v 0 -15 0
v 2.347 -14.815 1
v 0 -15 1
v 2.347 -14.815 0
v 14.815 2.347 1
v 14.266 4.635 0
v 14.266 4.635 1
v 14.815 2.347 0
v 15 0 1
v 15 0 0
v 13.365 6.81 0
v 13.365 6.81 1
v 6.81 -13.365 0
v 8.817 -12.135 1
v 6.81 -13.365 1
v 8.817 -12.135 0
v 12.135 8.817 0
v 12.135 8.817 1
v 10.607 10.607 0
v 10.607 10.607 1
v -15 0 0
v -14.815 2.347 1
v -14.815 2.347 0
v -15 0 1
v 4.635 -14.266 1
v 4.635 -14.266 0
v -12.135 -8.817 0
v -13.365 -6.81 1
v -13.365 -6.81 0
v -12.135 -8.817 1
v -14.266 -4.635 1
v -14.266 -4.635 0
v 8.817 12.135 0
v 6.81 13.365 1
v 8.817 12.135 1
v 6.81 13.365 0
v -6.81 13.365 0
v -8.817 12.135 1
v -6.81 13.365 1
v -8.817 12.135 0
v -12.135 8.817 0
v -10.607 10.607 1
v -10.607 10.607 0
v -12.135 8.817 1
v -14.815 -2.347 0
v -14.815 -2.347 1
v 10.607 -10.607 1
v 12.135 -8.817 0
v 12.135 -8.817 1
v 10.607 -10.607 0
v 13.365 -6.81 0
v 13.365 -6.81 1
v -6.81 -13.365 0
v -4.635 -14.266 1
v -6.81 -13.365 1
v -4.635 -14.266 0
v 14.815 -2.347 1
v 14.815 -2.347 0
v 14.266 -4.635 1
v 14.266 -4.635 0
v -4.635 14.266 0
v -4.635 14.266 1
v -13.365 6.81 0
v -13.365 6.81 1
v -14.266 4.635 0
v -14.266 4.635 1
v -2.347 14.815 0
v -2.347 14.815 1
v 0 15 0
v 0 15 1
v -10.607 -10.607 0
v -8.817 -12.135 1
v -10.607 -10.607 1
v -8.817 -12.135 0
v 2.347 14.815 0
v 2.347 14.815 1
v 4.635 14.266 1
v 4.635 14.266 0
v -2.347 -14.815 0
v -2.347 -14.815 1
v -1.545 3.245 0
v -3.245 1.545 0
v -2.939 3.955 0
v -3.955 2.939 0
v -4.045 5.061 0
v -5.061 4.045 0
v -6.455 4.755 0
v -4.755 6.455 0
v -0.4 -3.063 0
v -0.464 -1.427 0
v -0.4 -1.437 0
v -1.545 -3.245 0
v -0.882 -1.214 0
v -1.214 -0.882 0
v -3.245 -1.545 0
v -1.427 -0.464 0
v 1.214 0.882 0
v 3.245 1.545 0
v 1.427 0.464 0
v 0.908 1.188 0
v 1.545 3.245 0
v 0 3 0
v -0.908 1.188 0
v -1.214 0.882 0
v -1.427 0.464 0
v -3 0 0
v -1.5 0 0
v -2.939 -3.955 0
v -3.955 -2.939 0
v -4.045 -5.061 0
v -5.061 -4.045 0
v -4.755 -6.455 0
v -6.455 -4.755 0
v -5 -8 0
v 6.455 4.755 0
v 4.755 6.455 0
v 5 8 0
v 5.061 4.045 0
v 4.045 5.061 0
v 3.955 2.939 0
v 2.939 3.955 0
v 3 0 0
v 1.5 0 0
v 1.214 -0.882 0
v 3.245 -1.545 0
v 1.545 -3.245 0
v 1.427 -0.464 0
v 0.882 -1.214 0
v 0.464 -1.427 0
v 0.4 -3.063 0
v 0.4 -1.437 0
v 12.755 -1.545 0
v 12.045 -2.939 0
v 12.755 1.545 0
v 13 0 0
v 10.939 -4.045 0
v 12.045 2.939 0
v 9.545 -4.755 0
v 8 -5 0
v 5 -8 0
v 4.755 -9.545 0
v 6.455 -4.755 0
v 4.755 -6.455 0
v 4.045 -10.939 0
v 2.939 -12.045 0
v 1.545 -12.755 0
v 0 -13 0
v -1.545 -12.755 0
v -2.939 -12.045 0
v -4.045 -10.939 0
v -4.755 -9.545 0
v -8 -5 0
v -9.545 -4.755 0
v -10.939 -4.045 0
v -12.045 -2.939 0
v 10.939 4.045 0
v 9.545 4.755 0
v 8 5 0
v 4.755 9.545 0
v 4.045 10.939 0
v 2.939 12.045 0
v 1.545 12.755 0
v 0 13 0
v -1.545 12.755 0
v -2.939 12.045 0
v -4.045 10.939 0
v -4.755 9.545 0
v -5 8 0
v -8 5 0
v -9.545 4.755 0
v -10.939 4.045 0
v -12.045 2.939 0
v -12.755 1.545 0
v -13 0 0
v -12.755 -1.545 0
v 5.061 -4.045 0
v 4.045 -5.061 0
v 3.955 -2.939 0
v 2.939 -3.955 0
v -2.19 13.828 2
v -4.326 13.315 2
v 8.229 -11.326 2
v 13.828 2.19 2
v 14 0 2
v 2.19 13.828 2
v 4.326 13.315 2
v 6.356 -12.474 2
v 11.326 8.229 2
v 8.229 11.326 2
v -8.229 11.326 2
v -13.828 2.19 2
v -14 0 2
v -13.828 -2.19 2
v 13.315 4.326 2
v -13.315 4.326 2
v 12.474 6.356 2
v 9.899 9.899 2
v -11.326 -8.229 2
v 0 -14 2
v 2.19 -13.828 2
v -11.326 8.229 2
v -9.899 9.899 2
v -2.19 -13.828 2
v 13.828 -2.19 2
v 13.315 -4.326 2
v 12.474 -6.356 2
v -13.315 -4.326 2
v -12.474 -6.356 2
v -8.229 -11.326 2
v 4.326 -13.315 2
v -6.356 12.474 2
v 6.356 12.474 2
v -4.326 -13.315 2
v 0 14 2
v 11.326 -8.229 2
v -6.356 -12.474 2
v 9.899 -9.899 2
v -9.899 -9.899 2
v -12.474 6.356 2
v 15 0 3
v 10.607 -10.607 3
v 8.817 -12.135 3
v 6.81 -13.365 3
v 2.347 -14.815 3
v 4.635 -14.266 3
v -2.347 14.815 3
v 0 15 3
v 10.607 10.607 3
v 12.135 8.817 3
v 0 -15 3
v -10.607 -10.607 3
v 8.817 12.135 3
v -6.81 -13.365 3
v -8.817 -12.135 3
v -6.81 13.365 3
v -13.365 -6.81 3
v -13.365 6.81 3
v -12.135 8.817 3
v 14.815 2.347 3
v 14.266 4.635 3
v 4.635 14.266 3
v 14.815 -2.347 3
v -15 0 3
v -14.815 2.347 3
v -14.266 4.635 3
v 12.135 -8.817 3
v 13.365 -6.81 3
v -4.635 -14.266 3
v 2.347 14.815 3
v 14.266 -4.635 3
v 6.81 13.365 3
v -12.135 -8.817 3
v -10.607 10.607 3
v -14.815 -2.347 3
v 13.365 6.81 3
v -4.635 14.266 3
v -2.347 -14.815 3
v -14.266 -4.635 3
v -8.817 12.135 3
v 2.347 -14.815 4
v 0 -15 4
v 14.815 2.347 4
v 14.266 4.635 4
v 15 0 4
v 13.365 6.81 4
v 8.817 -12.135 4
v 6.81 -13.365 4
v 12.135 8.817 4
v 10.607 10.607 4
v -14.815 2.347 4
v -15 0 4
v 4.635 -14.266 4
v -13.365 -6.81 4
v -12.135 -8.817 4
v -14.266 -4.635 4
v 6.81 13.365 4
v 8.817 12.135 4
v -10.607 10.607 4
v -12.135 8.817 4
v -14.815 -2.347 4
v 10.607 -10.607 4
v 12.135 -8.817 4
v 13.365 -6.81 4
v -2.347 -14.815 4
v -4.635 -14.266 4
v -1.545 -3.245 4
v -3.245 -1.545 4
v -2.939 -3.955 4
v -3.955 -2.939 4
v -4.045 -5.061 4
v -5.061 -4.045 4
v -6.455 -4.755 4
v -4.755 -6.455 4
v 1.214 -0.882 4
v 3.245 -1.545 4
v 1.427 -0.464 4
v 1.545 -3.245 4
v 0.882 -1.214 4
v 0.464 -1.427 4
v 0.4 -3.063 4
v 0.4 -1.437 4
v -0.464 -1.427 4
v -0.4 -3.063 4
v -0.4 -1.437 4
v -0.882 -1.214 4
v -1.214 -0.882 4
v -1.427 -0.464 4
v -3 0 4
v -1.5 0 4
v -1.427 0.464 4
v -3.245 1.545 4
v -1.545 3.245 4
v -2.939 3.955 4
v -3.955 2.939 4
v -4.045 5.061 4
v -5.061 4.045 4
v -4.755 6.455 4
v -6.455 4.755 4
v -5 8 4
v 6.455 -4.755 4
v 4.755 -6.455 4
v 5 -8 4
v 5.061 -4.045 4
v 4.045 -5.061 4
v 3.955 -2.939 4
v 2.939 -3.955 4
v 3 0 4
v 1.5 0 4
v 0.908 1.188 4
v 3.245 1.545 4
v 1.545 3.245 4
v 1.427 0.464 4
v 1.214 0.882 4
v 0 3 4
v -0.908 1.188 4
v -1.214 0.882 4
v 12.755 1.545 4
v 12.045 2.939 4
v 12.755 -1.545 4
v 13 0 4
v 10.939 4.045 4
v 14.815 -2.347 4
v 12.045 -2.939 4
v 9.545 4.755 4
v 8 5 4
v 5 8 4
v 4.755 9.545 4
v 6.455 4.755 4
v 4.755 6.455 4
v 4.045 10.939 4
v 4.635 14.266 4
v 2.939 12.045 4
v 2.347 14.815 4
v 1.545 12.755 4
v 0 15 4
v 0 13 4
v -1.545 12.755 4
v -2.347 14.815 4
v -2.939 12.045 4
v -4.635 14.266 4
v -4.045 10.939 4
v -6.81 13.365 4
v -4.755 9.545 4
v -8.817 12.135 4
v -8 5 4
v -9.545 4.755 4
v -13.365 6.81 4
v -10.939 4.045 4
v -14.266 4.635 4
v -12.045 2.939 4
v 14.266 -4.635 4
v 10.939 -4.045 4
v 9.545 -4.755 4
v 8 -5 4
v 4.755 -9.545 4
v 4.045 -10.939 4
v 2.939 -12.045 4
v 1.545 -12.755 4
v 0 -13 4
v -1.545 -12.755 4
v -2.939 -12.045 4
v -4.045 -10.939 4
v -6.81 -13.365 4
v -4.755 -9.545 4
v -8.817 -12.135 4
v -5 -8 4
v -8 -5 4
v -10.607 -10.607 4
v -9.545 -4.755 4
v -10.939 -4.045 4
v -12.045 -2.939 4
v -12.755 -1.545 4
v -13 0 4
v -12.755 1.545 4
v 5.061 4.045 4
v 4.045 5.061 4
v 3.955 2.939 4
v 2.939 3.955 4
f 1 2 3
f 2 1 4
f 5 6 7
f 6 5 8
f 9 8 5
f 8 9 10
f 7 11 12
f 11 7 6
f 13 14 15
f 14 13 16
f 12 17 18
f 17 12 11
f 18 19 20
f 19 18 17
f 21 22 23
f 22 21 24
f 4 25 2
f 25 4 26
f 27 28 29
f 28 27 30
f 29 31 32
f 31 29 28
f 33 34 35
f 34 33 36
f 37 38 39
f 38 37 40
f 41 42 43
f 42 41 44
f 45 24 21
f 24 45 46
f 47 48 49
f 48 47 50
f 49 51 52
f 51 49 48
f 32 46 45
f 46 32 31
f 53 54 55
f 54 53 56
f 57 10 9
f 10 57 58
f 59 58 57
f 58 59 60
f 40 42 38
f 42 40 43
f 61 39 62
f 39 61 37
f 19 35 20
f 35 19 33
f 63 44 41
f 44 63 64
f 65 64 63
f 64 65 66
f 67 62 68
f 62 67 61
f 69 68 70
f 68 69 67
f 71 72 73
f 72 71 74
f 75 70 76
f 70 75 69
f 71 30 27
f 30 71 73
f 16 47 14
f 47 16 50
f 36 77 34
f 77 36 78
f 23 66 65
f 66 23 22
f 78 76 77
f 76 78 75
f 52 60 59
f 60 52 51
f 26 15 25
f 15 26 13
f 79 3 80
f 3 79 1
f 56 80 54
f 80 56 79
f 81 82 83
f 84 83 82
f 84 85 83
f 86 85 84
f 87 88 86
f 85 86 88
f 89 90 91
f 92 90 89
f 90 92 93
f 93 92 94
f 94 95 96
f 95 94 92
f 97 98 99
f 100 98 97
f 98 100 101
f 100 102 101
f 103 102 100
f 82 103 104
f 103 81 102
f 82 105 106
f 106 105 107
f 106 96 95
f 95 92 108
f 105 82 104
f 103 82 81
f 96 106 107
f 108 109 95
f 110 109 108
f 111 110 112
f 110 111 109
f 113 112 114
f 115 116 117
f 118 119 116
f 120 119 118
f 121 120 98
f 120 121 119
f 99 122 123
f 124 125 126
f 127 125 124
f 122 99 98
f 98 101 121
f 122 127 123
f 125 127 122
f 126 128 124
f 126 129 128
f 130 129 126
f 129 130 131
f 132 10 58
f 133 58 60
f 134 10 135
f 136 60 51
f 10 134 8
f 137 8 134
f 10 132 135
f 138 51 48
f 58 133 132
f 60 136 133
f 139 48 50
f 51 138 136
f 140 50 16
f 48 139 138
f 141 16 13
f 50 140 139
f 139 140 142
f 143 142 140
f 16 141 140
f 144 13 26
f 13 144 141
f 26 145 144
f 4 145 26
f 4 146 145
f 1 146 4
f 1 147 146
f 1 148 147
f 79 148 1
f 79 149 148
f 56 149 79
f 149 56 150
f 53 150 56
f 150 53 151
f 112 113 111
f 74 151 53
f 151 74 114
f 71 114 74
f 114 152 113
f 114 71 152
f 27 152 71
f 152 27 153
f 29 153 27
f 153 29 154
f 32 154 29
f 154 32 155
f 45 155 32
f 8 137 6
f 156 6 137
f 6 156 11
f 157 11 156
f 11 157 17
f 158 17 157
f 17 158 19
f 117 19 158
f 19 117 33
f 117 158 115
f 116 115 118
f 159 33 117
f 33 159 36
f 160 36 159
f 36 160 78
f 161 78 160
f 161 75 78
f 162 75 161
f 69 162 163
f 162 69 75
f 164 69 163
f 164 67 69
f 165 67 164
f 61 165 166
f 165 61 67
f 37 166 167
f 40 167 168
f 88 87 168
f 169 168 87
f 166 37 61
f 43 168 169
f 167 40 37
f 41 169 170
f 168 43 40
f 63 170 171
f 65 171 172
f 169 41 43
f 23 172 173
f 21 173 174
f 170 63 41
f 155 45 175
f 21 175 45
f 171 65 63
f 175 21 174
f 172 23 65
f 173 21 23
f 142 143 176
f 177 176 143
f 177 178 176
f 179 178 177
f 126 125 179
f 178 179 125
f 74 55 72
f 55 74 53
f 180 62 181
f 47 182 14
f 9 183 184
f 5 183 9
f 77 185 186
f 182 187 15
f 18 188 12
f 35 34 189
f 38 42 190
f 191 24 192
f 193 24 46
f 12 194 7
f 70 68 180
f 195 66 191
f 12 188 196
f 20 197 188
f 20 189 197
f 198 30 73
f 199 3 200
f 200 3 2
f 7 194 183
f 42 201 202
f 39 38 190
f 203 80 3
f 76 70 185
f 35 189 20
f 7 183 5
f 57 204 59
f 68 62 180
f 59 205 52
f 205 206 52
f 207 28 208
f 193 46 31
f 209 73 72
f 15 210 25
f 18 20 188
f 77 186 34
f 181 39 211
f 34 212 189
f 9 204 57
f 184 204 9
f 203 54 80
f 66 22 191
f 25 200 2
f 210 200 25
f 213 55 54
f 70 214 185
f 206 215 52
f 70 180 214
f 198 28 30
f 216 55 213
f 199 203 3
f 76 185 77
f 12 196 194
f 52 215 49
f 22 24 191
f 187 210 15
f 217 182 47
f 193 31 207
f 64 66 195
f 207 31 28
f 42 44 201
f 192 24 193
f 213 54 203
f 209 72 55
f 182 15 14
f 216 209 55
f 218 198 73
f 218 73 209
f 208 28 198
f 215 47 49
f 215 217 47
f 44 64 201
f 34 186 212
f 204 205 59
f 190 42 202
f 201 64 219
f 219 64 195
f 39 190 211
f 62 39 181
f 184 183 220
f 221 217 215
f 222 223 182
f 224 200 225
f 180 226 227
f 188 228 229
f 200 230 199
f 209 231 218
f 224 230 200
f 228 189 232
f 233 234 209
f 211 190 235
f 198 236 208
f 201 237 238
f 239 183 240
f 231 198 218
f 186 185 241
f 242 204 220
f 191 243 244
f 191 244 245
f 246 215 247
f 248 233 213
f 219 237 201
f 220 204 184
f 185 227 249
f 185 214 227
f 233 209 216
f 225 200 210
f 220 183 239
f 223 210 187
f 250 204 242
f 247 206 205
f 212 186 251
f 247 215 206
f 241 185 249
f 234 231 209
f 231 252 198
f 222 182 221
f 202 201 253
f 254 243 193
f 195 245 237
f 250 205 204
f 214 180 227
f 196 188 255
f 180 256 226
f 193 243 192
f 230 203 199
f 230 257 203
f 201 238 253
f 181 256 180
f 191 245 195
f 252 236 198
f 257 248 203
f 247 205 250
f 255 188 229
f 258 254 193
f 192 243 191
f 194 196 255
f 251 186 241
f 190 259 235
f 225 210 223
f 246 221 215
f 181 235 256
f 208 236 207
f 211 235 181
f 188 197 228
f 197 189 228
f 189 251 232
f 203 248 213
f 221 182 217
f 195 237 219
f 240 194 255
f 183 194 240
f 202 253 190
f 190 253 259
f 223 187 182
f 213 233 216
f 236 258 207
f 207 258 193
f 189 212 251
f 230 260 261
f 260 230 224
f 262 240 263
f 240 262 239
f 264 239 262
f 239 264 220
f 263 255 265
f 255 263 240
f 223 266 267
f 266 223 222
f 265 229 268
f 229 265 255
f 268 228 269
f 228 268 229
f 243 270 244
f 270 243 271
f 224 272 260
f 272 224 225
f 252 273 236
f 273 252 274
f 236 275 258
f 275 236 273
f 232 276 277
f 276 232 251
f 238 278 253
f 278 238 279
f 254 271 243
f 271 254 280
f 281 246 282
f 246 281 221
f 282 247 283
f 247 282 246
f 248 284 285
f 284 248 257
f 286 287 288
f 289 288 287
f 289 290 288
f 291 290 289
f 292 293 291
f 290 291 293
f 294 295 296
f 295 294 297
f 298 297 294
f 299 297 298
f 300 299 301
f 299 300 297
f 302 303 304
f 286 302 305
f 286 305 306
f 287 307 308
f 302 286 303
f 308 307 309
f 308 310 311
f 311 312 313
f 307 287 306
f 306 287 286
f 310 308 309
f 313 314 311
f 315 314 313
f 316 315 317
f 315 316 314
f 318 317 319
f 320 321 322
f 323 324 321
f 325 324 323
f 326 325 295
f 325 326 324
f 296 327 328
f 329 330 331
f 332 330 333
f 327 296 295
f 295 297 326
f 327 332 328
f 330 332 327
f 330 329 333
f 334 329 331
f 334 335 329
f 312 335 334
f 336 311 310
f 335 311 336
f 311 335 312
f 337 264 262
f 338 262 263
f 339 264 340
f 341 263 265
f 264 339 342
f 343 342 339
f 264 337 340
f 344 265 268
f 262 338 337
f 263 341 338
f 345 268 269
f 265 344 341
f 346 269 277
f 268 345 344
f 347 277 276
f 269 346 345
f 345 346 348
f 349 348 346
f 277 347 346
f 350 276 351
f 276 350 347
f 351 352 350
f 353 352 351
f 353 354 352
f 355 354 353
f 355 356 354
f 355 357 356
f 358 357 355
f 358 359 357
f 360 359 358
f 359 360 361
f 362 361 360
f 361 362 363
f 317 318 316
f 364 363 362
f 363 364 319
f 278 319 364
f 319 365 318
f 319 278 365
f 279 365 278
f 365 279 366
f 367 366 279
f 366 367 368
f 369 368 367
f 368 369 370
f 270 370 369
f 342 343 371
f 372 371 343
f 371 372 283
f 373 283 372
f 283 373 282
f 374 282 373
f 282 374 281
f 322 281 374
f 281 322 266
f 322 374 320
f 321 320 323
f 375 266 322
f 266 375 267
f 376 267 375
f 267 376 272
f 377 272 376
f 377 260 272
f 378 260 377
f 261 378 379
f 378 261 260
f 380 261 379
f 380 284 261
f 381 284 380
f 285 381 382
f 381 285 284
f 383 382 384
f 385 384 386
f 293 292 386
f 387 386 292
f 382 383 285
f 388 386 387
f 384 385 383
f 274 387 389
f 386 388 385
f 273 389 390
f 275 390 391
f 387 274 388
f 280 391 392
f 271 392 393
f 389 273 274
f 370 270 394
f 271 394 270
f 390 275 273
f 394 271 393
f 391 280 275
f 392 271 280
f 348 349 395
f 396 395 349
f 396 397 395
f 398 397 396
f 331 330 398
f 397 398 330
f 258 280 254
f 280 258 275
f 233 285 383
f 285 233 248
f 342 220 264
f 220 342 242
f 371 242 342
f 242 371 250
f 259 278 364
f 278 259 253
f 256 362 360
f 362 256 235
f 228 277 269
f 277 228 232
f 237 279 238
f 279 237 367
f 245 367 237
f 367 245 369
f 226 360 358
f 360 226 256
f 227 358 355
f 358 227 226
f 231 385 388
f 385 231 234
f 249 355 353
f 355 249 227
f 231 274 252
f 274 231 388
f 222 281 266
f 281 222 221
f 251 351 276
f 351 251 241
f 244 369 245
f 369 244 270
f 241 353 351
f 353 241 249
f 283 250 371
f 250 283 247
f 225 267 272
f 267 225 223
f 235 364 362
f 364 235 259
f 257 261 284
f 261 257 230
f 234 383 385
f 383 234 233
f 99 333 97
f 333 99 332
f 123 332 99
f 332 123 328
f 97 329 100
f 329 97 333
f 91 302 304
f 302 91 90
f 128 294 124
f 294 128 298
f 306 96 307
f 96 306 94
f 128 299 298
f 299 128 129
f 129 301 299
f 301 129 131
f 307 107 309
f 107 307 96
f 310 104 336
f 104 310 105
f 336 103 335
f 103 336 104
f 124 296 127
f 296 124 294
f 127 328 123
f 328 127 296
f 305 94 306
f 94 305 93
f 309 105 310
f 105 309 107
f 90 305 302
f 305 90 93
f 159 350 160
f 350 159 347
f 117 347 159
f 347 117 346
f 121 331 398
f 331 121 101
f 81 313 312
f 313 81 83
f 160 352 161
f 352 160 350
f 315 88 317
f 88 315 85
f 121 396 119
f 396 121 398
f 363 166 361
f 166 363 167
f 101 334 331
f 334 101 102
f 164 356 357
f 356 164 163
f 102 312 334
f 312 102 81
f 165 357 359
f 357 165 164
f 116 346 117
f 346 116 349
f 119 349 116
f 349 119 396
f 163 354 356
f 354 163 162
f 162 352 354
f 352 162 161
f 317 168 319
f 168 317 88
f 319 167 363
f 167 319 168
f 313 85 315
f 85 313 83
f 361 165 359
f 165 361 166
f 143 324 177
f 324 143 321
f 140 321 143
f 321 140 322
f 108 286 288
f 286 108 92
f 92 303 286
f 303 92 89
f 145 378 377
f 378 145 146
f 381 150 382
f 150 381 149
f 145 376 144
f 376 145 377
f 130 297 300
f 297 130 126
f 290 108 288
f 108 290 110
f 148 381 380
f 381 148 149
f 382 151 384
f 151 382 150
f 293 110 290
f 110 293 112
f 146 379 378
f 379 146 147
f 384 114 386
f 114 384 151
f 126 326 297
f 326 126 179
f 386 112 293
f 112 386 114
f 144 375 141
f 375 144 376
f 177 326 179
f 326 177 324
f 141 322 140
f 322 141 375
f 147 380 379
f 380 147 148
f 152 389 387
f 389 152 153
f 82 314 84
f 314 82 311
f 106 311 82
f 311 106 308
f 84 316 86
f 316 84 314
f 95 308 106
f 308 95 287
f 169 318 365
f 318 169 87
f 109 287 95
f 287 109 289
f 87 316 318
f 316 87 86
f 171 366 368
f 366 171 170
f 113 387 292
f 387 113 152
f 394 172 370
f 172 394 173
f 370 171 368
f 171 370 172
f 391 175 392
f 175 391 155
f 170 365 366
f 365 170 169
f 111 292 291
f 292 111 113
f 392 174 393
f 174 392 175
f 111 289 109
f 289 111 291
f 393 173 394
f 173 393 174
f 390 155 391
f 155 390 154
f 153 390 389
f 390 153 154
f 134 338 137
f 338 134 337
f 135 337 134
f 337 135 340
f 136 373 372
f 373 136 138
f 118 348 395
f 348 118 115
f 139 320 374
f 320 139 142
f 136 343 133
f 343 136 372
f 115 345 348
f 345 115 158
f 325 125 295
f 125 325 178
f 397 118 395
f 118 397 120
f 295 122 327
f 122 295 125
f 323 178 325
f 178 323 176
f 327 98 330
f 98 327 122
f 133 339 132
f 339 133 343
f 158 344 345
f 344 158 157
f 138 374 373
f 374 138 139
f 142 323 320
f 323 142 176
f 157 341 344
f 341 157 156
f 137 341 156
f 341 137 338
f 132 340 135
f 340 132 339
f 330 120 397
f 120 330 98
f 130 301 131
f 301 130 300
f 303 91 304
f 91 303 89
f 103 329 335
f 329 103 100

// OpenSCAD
// Rueda de 32mm (con junta tórica) para Sapoconcho
// o cualquier micromotor de 3mm de eje

union()
{
    difference()
    {
        union()
        {
            cylinder(h=1,r1=15,r2=15,$fn=40);
            translate([0,0,1])
            cylinder(h=1,r1=15,r2=14,$fn=40);
            translate([0,0,2])
            cylinder(h=1,r1=14,r2=15,$fn=40);
            translate([0,0,3])
            cylinder(h=1,r1=15,r2=15,$fn=40);
        }
        
        r_eje=1.5;
        translate([0,0,-1])
        cylinder(h=6,r1=r_eje,r2=r_eje,$fn=20);
    
        r=8;    
        translate([0,r,-1])
        cylinder(h=6,r1=5,r2=5,$fn=20);
        translate([0,-r,-1])
        cylinder(h=6,r1=5,r2=5,$fn=20);
        translate([-r,0,-1])
        cylinder(h=6,r1=5,r2=5,$fn=20);
        translate([r,0,-1])
        cylinder(h=6,r1=5,r2=5,$fn=20);
    
        translate([-.4,-4,-1]) scale ([.2,1,1.5])
        cube(4);
    }

    translate([0,1.4375,2]) scale ([1,.125,1])
    cube(4,center=true);
}
